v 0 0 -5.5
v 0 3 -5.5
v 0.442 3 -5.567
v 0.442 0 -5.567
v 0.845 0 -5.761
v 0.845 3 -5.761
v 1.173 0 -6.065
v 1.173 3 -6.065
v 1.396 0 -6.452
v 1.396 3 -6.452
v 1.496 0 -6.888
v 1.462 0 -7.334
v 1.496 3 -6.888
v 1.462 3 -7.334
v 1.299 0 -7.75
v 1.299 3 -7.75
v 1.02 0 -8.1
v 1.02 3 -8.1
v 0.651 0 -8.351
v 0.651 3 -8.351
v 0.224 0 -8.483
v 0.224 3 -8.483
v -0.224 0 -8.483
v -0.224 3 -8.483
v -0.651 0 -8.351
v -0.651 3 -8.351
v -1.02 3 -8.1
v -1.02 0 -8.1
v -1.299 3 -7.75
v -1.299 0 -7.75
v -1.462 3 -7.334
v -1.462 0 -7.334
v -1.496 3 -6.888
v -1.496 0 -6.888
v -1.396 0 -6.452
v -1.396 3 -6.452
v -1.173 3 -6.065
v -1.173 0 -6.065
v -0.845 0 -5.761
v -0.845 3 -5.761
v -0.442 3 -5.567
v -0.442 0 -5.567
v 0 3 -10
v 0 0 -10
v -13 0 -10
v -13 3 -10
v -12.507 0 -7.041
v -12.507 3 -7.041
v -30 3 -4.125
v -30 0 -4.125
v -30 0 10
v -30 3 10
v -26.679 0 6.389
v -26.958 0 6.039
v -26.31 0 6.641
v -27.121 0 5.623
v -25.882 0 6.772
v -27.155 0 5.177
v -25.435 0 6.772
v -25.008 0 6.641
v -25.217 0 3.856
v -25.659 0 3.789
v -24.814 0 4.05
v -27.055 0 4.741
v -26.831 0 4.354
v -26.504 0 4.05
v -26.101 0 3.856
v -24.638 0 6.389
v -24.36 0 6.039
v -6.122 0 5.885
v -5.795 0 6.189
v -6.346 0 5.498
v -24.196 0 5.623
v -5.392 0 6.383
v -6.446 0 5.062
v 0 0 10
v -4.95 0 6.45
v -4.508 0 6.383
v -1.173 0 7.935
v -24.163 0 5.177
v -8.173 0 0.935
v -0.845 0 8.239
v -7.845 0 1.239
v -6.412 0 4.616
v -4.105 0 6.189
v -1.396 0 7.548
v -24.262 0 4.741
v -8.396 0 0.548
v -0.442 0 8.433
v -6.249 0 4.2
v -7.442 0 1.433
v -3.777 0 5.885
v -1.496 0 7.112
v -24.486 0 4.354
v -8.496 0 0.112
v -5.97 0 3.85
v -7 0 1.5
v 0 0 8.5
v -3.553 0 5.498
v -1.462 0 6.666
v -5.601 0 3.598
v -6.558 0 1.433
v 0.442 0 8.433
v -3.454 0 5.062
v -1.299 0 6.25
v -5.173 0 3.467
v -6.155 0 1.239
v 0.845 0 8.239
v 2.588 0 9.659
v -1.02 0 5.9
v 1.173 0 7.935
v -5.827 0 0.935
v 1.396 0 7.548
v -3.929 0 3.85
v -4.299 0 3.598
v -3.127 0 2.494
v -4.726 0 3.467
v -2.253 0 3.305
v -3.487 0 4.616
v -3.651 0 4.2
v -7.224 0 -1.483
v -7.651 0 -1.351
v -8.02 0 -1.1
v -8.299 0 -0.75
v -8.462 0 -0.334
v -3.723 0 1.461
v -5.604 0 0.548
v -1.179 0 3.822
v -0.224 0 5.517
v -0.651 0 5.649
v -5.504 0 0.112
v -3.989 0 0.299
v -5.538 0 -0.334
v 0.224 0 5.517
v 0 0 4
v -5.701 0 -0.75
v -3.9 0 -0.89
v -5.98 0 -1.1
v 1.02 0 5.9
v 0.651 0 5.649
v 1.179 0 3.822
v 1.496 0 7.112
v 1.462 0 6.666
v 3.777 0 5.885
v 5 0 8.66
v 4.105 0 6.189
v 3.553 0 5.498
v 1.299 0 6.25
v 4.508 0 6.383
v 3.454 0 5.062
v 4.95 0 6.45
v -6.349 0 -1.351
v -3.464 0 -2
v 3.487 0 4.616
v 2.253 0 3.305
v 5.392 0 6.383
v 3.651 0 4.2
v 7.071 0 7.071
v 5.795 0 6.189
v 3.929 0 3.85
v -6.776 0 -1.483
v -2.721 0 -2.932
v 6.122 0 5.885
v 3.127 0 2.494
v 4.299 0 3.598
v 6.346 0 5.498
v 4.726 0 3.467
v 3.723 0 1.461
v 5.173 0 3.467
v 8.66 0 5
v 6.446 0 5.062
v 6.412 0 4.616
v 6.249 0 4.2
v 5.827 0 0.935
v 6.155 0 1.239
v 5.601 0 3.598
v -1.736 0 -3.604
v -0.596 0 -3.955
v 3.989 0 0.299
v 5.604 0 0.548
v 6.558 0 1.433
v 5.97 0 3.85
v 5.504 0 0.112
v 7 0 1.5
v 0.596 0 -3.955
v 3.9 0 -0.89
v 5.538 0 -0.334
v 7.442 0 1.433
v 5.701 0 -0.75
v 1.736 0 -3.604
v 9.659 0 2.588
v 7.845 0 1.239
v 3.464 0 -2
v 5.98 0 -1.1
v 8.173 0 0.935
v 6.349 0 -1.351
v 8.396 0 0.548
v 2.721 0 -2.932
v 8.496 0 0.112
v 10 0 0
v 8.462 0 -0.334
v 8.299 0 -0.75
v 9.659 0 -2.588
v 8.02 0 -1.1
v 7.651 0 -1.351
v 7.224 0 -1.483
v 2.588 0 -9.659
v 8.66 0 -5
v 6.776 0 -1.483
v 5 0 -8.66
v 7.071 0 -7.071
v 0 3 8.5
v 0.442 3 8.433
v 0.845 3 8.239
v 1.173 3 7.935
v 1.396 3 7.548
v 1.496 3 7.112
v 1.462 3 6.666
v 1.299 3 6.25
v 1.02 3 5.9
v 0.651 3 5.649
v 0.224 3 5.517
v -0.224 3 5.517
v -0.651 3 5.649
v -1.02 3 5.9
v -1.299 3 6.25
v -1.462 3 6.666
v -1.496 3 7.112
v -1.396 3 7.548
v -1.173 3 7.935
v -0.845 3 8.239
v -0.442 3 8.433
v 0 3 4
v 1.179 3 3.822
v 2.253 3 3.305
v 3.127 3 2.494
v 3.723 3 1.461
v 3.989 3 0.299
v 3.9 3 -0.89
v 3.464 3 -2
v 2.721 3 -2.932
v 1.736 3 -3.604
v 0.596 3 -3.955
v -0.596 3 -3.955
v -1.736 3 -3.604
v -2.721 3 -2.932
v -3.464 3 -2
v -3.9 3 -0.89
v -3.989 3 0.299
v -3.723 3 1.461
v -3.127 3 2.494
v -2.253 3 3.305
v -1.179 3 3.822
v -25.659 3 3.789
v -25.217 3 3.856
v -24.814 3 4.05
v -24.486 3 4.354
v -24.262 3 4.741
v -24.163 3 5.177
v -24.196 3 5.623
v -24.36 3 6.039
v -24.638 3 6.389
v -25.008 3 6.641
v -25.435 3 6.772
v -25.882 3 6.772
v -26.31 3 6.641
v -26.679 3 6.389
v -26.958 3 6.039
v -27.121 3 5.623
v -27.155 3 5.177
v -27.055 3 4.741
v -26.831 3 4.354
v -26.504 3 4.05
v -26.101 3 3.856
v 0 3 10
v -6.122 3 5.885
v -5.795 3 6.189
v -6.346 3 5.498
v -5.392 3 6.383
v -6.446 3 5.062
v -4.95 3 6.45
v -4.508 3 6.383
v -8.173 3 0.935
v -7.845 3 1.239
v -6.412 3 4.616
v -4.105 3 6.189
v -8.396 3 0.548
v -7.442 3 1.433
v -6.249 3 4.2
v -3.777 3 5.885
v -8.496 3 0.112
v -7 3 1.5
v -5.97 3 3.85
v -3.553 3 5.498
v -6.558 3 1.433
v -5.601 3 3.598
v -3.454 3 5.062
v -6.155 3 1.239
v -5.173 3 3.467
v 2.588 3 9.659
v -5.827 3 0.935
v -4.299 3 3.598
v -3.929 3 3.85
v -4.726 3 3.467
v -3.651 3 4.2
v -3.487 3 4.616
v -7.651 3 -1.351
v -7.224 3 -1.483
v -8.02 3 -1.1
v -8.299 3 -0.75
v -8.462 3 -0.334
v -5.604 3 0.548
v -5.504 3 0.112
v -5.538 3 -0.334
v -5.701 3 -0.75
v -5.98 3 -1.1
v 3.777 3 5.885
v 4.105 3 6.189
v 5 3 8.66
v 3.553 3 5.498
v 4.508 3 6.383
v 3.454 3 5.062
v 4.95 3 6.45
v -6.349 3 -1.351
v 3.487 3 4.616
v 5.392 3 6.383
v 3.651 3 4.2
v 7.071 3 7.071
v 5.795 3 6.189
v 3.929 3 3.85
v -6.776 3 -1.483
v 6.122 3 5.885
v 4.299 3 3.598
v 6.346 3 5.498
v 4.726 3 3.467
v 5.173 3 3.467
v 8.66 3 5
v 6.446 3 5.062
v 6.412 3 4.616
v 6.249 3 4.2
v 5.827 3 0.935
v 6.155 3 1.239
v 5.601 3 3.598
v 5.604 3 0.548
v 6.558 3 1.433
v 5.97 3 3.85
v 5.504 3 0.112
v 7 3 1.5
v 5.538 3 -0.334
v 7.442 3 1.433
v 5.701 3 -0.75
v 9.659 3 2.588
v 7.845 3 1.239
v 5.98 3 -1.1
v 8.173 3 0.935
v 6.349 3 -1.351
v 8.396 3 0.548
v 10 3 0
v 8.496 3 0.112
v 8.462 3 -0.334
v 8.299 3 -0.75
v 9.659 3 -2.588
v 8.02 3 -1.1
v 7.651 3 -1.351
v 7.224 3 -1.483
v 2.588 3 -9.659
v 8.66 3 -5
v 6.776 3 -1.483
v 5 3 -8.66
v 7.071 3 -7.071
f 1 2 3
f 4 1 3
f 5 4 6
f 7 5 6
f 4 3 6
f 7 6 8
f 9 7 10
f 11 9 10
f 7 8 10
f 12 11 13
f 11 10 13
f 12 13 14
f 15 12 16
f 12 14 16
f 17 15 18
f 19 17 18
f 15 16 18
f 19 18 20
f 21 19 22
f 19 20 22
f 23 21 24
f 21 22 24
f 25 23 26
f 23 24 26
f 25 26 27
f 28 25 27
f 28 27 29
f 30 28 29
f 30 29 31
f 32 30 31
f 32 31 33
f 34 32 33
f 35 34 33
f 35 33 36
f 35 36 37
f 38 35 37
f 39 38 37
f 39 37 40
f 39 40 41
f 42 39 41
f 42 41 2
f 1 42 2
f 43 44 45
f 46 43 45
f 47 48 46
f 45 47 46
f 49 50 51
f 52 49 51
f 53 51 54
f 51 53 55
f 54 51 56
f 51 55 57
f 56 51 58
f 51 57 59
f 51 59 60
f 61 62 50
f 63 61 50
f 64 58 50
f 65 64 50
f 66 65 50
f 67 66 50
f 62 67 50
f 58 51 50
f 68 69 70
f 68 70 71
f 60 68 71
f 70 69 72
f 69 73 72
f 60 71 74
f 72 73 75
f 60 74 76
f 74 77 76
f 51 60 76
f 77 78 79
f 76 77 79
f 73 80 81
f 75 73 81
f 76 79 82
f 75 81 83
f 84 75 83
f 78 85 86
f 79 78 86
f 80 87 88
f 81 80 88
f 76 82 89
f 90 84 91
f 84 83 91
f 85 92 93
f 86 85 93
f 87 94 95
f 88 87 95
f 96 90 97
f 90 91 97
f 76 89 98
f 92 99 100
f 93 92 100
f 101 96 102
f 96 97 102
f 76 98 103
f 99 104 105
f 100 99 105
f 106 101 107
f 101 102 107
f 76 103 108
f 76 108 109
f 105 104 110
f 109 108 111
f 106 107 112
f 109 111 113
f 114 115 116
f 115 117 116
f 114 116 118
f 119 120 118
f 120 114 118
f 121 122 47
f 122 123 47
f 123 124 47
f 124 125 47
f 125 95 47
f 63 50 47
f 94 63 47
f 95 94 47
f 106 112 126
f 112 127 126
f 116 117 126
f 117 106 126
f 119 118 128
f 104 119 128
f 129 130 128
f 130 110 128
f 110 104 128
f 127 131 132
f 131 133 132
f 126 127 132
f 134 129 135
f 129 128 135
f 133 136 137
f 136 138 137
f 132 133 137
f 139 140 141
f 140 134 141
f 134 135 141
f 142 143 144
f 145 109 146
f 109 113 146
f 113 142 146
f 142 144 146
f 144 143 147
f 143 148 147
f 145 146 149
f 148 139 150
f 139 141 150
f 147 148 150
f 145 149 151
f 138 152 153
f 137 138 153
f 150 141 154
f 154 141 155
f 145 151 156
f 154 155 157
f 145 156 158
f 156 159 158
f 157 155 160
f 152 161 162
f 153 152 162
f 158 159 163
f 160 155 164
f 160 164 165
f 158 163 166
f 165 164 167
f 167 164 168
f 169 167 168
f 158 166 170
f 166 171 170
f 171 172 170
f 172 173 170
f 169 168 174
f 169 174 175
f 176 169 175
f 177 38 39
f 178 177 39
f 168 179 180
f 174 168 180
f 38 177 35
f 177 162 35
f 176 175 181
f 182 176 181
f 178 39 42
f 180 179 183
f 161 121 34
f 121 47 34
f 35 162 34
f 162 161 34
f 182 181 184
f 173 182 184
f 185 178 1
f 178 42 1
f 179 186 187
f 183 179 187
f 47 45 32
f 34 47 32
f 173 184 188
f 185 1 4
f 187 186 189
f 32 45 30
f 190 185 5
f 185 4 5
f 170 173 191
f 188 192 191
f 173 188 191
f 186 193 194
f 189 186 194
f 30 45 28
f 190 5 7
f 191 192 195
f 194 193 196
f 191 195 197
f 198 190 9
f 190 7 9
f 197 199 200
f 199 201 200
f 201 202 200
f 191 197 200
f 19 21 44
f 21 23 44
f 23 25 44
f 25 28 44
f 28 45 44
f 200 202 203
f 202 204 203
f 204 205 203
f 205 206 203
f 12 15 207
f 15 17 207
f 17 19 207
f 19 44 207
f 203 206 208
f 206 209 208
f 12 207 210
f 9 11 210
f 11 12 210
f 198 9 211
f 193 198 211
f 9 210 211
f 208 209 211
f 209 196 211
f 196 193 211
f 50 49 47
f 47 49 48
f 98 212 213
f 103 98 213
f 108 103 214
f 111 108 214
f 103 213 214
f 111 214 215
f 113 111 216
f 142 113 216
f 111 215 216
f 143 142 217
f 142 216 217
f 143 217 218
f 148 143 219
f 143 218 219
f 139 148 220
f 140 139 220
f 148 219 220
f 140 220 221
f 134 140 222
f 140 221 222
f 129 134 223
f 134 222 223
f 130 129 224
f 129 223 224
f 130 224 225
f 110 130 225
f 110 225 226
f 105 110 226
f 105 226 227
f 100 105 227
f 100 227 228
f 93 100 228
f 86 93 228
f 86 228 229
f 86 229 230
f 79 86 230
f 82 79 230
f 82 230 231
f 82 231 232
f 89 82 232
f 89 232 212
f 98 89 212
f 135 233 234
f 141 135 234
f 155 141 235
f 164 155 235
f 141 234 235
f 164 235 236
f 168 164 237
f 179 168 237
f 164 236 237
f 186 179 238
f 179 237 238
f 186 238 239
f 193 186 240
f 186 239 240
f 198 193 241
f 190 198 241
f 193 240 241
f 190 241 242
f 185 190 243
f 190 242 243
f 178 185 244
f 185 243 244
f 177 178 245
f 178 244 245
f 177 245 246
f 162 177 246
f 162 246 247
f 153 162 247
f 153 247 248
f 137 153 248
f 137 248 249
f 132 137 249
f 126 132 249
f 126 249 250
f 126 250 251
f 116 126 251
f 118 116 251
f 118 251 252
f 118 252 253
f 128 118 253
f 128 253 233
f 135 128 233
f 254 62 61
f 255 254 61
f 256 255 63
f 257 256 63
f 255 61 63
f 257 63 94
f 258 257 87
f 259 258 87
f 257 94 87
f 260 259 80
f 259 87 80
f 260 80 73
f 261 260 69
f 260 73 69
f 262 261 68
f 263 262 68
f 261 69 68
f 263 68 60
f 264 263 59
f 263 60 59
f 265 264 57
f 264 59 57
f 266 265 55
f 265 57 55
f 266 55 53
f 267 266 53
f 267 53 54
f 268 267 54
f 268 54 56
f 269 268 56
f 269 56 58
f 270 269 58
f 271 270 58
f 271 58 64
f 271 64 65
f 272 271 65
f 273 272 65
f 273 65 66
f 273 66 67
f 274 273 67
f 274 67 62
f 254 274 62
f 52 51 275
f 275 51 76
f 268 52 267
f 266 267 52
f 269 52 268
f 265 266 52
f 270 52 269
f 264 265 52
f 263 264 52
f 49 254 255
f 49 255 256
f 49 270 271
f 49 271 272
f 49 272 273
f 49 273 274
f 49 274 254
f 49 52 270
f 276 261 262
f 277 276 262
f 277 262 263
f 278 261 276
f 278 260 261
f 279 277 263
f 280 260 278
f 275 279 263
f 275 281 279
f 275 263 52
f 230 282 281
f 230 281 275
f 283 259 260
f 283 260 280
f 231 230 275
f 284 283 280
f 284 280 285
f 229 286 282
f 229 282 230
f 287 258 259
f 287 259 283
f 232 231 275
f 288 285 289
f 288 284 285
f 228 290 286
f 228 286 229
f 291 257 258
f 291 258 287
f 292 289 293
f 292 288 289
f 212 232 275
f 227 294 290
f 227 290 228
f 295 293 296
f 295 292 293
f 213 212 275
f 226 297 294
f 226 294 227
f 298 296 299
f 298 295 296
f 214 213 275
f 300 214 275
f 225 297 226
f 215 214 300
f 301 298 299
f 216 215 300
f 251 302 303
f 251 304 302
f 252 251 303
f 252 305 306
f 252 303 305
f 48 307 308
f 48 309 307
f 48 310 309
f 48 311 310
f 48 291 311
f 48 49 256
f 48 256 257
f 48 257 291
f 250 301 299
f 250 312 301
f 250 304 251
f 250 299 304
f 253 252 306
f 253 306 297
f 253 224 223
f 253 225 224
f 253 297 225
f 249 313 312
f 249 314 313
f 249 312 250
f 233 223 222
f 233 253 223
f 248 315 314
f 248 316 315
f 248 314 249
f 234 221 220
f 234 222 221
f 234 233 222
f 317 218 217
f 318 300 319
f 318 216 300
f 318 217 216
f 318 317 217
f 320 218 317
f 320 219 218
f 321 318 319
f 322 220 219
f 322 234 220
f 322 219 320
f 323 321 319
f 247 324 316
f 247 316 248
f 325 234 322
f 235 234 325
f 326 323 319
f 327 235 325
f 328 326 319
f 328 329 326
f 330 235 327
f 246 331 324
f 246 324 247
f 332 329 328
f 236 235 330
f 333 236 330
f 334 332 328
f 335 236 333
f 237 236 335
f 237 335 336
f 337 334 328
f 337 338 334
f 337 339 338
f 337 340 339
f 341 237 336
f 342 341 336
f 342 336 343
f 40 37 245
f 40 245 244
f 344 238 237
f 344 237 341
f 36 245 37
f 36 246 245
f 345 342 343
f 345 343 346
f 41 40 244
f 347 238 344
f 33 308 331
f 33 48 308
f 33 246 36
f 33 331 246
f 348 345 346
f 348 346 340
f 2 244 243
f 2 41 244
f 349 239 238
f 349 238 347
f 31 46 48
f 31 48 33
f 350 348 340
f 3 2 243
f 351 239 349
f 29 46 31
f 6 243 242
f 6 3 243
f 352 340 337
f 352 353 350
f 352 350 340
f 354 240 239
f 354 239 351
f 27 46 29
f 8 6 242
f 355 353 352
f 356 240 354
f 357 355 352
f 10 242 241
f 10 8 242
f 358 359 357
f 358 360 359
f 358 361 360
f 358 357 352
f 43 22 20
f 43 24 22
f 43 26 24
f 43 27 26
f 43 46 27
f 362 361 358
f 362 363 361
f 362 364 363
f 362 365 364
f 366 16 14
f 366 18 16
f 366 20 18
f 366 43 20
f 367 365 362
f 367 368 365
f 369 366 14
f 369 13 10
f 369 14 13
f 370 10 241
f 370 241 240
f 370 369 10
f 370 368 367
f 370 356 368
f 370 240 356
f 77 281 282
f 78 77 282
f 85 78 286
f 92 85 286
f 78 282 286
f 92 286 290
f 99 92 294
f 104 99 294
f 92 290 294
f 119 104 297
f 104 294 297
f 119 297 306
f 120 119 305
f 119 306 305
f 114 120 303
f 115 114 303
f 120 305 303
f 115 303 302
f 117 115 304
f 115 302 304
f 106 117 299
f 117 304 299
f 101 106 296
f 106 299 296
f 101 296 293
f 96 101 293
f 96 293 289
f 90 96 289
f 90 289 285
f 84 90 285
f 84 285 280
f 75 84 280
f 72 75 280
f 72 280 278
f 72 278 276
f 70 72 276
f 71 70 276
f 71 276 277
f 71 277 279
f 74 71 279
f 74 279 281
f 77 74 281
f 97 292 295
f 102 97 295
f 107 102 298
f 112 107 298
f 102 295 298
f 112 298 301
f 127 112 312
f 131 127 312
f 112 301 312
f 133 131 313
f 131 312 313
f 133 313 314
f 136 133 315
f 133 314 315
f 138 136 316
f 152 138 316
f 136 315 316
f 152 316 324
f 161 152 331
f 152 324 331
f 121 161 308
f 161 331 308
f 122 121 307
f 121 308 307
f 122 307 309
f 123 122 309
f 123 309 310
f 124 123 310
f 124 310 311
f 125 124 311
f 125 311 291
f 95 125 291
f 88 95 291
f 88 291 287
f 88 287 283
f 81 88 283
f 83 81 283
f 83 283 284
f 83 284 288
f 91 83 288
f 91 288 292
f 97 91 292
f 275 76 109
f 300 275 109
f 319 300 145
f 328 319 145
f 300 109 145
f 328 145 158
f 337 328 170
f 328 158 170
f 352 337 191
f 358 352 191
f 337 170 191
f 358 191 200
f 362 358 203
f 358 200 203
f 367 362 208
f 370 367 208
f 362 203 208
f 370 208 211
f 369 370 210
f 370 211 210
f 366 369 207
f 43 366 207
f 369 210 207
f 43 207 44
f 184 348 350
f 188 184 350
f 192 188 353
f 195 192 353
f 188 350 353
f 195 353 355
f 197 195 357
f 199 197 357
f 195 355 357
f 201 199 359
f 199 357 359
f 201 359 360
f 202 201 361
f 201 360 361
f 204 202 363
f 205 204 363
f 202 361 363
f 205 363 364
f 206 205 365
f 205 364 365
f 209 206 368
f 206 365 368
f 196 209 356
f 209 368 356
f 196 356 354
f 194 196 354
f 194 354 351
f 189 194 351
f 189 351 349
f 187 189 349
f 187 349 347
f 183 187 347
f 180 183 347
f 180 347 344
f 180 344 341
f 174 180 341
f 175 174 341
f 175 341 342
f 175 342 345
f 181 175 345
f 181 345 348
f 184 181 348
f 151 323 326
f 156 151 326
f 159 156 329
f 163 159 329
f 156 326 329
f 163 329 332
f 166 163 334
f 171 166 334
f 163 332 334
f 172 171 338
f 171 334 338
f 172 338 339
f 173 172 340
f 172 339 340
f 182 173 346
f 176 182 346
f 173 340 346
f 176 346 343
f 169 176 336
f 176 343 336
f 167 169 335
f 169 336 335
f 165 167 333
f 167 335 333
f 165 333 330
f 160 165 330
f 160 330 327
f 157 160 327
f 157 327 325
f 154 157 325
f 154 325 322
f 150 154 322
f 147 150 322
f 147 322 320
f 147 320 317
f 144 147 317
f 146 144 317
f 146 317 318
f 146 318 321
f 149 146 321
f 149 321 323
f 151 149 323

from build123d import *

# Parameters (mm, degrees)
SKETCH_1_R          = 10
EXTRUDE_1_DEPTH     = 3
SKETCH_2_R          = 4
CUT_EXTRUDE_1_DEPTH = 15.456832295
SKETCH_3_R          = 1.5
CUT_EXTRUDE_2_DEPTH = 15.456832295
EXTRUDE_START       = -3
EXTRUDE_3_DEPTH     = 3
CUT_EXTRUDE_3_DEPTH = 32.764760349
SKETCH_10_R         = 1.5
CUT_EXTRUDE_6_DEPTH = 32.764760349


with BuildPart() as part:
    # 草图1 → 凸台-拉伸1 (new body)
    with BuildSketch(Plane(origin=(0, 0, 0), x_dir=(1, 0, 0), z_dir=(0, 1, 0))):
        with Locations(Location((0, 0, 0), (0, 0, 270))):
            Circle(SKETCH_1_R)
    extrude(amount=EXTRUDE_1_DEPTH)

    # 草图2 → 切除-拉伸1 (cut, through all)
    with BuildSketch(Plane(origin=(0, 3, 0), x_dir=(1, 0, 0), z_dir=(0, 1, 0))):
        with Locations(Location((0, 0, 0), (0, 0, 270))):
            Circle(SKETCH_2_R)
    extrude(amount=-CUT_EXTRUDE_1_DEPTH, mode=Mode.SUBTRACT)

    # 草图3 → 切除-拉伸2 (cut, through all)
    with BuildSketch(Plane(origin=(0, 3, 0), x_dir=(1, 0, 0), z_dir=(0, 1, 0))):
        with Locations(Location((7, 0, 0), (0, 0, 270))):
            Circle(SKETCH_3_R)
        with Locations(Location((4.949747468, -4.949747468, 0), (0, 0, 270))):
            Circle(SKETCH_3_R)
        with Locations(Location((0, -7, 0), (0, 0, 270))):
            Circle(SKETCH_3_R)
        with Locations(Location((-4.949747468, -4.949747468, 0), (0, 0, 270))):
            Circle(SKETCH_3_R)
        with Locations(Location((-7, 0, 0), (0, 0, 270))):
            Circle(SKETCH_3_R)
        with Locations(Location((0, 7, 0), (0, 0, 270))):
            Circle(SKETCH_3_R)
    extrude(amount=-CUT_EXTRUDE_2_DEPTH, mode=Mode.SUBTRACT)

    # 草图6 → 凸台-拉伸3 (add)
    with BuildSketch(Plane(origin=(0, 3, 0), x_dir=(1, 0, 0), z_dir=(0, 1, 0)).offset(EXTRUDE_START)):
        with BuildLine():
            Line((0, 10), (-30, 10))
            Line((-30, 10), (-30, -10))
            Line((-30, -10), (0, -10))
            ThreePointArc((0, -10), (-10, 0), (0, 10))
        make_face()
    extrude(amount=EXTRUDE_3_DEPTH)

    # 草图7 → 切除-拉伸3 (cut, through all)
    with BuildSketch(Plane(origin=(0, 3, 0), x_dir=(1, 0, 0), z_dir=(0, 1, 0))):
        Polygon((-30, 4.125285706), (-12.506803088, 7.04081822), (-13, 10), (-30, 10), align=None)
    extrude(amount=-CUT_EXTRUDE_3_DEPTH, mode=Mode.SUBTRACT)

    # 草图10 → 切除-拉伸6 (cut, through all)
    with BuildSketch(Plane.XZ):
        with Locations(Location((-25.658723667, 5.289102386, 0), (0, 0, 270))):
            Circle(SKETCH_10_R)
    extrude(amount=-CUT_EXTRUDE_6_DEPTH, mode=Mode.SUBTRACT)


solid = part.part
